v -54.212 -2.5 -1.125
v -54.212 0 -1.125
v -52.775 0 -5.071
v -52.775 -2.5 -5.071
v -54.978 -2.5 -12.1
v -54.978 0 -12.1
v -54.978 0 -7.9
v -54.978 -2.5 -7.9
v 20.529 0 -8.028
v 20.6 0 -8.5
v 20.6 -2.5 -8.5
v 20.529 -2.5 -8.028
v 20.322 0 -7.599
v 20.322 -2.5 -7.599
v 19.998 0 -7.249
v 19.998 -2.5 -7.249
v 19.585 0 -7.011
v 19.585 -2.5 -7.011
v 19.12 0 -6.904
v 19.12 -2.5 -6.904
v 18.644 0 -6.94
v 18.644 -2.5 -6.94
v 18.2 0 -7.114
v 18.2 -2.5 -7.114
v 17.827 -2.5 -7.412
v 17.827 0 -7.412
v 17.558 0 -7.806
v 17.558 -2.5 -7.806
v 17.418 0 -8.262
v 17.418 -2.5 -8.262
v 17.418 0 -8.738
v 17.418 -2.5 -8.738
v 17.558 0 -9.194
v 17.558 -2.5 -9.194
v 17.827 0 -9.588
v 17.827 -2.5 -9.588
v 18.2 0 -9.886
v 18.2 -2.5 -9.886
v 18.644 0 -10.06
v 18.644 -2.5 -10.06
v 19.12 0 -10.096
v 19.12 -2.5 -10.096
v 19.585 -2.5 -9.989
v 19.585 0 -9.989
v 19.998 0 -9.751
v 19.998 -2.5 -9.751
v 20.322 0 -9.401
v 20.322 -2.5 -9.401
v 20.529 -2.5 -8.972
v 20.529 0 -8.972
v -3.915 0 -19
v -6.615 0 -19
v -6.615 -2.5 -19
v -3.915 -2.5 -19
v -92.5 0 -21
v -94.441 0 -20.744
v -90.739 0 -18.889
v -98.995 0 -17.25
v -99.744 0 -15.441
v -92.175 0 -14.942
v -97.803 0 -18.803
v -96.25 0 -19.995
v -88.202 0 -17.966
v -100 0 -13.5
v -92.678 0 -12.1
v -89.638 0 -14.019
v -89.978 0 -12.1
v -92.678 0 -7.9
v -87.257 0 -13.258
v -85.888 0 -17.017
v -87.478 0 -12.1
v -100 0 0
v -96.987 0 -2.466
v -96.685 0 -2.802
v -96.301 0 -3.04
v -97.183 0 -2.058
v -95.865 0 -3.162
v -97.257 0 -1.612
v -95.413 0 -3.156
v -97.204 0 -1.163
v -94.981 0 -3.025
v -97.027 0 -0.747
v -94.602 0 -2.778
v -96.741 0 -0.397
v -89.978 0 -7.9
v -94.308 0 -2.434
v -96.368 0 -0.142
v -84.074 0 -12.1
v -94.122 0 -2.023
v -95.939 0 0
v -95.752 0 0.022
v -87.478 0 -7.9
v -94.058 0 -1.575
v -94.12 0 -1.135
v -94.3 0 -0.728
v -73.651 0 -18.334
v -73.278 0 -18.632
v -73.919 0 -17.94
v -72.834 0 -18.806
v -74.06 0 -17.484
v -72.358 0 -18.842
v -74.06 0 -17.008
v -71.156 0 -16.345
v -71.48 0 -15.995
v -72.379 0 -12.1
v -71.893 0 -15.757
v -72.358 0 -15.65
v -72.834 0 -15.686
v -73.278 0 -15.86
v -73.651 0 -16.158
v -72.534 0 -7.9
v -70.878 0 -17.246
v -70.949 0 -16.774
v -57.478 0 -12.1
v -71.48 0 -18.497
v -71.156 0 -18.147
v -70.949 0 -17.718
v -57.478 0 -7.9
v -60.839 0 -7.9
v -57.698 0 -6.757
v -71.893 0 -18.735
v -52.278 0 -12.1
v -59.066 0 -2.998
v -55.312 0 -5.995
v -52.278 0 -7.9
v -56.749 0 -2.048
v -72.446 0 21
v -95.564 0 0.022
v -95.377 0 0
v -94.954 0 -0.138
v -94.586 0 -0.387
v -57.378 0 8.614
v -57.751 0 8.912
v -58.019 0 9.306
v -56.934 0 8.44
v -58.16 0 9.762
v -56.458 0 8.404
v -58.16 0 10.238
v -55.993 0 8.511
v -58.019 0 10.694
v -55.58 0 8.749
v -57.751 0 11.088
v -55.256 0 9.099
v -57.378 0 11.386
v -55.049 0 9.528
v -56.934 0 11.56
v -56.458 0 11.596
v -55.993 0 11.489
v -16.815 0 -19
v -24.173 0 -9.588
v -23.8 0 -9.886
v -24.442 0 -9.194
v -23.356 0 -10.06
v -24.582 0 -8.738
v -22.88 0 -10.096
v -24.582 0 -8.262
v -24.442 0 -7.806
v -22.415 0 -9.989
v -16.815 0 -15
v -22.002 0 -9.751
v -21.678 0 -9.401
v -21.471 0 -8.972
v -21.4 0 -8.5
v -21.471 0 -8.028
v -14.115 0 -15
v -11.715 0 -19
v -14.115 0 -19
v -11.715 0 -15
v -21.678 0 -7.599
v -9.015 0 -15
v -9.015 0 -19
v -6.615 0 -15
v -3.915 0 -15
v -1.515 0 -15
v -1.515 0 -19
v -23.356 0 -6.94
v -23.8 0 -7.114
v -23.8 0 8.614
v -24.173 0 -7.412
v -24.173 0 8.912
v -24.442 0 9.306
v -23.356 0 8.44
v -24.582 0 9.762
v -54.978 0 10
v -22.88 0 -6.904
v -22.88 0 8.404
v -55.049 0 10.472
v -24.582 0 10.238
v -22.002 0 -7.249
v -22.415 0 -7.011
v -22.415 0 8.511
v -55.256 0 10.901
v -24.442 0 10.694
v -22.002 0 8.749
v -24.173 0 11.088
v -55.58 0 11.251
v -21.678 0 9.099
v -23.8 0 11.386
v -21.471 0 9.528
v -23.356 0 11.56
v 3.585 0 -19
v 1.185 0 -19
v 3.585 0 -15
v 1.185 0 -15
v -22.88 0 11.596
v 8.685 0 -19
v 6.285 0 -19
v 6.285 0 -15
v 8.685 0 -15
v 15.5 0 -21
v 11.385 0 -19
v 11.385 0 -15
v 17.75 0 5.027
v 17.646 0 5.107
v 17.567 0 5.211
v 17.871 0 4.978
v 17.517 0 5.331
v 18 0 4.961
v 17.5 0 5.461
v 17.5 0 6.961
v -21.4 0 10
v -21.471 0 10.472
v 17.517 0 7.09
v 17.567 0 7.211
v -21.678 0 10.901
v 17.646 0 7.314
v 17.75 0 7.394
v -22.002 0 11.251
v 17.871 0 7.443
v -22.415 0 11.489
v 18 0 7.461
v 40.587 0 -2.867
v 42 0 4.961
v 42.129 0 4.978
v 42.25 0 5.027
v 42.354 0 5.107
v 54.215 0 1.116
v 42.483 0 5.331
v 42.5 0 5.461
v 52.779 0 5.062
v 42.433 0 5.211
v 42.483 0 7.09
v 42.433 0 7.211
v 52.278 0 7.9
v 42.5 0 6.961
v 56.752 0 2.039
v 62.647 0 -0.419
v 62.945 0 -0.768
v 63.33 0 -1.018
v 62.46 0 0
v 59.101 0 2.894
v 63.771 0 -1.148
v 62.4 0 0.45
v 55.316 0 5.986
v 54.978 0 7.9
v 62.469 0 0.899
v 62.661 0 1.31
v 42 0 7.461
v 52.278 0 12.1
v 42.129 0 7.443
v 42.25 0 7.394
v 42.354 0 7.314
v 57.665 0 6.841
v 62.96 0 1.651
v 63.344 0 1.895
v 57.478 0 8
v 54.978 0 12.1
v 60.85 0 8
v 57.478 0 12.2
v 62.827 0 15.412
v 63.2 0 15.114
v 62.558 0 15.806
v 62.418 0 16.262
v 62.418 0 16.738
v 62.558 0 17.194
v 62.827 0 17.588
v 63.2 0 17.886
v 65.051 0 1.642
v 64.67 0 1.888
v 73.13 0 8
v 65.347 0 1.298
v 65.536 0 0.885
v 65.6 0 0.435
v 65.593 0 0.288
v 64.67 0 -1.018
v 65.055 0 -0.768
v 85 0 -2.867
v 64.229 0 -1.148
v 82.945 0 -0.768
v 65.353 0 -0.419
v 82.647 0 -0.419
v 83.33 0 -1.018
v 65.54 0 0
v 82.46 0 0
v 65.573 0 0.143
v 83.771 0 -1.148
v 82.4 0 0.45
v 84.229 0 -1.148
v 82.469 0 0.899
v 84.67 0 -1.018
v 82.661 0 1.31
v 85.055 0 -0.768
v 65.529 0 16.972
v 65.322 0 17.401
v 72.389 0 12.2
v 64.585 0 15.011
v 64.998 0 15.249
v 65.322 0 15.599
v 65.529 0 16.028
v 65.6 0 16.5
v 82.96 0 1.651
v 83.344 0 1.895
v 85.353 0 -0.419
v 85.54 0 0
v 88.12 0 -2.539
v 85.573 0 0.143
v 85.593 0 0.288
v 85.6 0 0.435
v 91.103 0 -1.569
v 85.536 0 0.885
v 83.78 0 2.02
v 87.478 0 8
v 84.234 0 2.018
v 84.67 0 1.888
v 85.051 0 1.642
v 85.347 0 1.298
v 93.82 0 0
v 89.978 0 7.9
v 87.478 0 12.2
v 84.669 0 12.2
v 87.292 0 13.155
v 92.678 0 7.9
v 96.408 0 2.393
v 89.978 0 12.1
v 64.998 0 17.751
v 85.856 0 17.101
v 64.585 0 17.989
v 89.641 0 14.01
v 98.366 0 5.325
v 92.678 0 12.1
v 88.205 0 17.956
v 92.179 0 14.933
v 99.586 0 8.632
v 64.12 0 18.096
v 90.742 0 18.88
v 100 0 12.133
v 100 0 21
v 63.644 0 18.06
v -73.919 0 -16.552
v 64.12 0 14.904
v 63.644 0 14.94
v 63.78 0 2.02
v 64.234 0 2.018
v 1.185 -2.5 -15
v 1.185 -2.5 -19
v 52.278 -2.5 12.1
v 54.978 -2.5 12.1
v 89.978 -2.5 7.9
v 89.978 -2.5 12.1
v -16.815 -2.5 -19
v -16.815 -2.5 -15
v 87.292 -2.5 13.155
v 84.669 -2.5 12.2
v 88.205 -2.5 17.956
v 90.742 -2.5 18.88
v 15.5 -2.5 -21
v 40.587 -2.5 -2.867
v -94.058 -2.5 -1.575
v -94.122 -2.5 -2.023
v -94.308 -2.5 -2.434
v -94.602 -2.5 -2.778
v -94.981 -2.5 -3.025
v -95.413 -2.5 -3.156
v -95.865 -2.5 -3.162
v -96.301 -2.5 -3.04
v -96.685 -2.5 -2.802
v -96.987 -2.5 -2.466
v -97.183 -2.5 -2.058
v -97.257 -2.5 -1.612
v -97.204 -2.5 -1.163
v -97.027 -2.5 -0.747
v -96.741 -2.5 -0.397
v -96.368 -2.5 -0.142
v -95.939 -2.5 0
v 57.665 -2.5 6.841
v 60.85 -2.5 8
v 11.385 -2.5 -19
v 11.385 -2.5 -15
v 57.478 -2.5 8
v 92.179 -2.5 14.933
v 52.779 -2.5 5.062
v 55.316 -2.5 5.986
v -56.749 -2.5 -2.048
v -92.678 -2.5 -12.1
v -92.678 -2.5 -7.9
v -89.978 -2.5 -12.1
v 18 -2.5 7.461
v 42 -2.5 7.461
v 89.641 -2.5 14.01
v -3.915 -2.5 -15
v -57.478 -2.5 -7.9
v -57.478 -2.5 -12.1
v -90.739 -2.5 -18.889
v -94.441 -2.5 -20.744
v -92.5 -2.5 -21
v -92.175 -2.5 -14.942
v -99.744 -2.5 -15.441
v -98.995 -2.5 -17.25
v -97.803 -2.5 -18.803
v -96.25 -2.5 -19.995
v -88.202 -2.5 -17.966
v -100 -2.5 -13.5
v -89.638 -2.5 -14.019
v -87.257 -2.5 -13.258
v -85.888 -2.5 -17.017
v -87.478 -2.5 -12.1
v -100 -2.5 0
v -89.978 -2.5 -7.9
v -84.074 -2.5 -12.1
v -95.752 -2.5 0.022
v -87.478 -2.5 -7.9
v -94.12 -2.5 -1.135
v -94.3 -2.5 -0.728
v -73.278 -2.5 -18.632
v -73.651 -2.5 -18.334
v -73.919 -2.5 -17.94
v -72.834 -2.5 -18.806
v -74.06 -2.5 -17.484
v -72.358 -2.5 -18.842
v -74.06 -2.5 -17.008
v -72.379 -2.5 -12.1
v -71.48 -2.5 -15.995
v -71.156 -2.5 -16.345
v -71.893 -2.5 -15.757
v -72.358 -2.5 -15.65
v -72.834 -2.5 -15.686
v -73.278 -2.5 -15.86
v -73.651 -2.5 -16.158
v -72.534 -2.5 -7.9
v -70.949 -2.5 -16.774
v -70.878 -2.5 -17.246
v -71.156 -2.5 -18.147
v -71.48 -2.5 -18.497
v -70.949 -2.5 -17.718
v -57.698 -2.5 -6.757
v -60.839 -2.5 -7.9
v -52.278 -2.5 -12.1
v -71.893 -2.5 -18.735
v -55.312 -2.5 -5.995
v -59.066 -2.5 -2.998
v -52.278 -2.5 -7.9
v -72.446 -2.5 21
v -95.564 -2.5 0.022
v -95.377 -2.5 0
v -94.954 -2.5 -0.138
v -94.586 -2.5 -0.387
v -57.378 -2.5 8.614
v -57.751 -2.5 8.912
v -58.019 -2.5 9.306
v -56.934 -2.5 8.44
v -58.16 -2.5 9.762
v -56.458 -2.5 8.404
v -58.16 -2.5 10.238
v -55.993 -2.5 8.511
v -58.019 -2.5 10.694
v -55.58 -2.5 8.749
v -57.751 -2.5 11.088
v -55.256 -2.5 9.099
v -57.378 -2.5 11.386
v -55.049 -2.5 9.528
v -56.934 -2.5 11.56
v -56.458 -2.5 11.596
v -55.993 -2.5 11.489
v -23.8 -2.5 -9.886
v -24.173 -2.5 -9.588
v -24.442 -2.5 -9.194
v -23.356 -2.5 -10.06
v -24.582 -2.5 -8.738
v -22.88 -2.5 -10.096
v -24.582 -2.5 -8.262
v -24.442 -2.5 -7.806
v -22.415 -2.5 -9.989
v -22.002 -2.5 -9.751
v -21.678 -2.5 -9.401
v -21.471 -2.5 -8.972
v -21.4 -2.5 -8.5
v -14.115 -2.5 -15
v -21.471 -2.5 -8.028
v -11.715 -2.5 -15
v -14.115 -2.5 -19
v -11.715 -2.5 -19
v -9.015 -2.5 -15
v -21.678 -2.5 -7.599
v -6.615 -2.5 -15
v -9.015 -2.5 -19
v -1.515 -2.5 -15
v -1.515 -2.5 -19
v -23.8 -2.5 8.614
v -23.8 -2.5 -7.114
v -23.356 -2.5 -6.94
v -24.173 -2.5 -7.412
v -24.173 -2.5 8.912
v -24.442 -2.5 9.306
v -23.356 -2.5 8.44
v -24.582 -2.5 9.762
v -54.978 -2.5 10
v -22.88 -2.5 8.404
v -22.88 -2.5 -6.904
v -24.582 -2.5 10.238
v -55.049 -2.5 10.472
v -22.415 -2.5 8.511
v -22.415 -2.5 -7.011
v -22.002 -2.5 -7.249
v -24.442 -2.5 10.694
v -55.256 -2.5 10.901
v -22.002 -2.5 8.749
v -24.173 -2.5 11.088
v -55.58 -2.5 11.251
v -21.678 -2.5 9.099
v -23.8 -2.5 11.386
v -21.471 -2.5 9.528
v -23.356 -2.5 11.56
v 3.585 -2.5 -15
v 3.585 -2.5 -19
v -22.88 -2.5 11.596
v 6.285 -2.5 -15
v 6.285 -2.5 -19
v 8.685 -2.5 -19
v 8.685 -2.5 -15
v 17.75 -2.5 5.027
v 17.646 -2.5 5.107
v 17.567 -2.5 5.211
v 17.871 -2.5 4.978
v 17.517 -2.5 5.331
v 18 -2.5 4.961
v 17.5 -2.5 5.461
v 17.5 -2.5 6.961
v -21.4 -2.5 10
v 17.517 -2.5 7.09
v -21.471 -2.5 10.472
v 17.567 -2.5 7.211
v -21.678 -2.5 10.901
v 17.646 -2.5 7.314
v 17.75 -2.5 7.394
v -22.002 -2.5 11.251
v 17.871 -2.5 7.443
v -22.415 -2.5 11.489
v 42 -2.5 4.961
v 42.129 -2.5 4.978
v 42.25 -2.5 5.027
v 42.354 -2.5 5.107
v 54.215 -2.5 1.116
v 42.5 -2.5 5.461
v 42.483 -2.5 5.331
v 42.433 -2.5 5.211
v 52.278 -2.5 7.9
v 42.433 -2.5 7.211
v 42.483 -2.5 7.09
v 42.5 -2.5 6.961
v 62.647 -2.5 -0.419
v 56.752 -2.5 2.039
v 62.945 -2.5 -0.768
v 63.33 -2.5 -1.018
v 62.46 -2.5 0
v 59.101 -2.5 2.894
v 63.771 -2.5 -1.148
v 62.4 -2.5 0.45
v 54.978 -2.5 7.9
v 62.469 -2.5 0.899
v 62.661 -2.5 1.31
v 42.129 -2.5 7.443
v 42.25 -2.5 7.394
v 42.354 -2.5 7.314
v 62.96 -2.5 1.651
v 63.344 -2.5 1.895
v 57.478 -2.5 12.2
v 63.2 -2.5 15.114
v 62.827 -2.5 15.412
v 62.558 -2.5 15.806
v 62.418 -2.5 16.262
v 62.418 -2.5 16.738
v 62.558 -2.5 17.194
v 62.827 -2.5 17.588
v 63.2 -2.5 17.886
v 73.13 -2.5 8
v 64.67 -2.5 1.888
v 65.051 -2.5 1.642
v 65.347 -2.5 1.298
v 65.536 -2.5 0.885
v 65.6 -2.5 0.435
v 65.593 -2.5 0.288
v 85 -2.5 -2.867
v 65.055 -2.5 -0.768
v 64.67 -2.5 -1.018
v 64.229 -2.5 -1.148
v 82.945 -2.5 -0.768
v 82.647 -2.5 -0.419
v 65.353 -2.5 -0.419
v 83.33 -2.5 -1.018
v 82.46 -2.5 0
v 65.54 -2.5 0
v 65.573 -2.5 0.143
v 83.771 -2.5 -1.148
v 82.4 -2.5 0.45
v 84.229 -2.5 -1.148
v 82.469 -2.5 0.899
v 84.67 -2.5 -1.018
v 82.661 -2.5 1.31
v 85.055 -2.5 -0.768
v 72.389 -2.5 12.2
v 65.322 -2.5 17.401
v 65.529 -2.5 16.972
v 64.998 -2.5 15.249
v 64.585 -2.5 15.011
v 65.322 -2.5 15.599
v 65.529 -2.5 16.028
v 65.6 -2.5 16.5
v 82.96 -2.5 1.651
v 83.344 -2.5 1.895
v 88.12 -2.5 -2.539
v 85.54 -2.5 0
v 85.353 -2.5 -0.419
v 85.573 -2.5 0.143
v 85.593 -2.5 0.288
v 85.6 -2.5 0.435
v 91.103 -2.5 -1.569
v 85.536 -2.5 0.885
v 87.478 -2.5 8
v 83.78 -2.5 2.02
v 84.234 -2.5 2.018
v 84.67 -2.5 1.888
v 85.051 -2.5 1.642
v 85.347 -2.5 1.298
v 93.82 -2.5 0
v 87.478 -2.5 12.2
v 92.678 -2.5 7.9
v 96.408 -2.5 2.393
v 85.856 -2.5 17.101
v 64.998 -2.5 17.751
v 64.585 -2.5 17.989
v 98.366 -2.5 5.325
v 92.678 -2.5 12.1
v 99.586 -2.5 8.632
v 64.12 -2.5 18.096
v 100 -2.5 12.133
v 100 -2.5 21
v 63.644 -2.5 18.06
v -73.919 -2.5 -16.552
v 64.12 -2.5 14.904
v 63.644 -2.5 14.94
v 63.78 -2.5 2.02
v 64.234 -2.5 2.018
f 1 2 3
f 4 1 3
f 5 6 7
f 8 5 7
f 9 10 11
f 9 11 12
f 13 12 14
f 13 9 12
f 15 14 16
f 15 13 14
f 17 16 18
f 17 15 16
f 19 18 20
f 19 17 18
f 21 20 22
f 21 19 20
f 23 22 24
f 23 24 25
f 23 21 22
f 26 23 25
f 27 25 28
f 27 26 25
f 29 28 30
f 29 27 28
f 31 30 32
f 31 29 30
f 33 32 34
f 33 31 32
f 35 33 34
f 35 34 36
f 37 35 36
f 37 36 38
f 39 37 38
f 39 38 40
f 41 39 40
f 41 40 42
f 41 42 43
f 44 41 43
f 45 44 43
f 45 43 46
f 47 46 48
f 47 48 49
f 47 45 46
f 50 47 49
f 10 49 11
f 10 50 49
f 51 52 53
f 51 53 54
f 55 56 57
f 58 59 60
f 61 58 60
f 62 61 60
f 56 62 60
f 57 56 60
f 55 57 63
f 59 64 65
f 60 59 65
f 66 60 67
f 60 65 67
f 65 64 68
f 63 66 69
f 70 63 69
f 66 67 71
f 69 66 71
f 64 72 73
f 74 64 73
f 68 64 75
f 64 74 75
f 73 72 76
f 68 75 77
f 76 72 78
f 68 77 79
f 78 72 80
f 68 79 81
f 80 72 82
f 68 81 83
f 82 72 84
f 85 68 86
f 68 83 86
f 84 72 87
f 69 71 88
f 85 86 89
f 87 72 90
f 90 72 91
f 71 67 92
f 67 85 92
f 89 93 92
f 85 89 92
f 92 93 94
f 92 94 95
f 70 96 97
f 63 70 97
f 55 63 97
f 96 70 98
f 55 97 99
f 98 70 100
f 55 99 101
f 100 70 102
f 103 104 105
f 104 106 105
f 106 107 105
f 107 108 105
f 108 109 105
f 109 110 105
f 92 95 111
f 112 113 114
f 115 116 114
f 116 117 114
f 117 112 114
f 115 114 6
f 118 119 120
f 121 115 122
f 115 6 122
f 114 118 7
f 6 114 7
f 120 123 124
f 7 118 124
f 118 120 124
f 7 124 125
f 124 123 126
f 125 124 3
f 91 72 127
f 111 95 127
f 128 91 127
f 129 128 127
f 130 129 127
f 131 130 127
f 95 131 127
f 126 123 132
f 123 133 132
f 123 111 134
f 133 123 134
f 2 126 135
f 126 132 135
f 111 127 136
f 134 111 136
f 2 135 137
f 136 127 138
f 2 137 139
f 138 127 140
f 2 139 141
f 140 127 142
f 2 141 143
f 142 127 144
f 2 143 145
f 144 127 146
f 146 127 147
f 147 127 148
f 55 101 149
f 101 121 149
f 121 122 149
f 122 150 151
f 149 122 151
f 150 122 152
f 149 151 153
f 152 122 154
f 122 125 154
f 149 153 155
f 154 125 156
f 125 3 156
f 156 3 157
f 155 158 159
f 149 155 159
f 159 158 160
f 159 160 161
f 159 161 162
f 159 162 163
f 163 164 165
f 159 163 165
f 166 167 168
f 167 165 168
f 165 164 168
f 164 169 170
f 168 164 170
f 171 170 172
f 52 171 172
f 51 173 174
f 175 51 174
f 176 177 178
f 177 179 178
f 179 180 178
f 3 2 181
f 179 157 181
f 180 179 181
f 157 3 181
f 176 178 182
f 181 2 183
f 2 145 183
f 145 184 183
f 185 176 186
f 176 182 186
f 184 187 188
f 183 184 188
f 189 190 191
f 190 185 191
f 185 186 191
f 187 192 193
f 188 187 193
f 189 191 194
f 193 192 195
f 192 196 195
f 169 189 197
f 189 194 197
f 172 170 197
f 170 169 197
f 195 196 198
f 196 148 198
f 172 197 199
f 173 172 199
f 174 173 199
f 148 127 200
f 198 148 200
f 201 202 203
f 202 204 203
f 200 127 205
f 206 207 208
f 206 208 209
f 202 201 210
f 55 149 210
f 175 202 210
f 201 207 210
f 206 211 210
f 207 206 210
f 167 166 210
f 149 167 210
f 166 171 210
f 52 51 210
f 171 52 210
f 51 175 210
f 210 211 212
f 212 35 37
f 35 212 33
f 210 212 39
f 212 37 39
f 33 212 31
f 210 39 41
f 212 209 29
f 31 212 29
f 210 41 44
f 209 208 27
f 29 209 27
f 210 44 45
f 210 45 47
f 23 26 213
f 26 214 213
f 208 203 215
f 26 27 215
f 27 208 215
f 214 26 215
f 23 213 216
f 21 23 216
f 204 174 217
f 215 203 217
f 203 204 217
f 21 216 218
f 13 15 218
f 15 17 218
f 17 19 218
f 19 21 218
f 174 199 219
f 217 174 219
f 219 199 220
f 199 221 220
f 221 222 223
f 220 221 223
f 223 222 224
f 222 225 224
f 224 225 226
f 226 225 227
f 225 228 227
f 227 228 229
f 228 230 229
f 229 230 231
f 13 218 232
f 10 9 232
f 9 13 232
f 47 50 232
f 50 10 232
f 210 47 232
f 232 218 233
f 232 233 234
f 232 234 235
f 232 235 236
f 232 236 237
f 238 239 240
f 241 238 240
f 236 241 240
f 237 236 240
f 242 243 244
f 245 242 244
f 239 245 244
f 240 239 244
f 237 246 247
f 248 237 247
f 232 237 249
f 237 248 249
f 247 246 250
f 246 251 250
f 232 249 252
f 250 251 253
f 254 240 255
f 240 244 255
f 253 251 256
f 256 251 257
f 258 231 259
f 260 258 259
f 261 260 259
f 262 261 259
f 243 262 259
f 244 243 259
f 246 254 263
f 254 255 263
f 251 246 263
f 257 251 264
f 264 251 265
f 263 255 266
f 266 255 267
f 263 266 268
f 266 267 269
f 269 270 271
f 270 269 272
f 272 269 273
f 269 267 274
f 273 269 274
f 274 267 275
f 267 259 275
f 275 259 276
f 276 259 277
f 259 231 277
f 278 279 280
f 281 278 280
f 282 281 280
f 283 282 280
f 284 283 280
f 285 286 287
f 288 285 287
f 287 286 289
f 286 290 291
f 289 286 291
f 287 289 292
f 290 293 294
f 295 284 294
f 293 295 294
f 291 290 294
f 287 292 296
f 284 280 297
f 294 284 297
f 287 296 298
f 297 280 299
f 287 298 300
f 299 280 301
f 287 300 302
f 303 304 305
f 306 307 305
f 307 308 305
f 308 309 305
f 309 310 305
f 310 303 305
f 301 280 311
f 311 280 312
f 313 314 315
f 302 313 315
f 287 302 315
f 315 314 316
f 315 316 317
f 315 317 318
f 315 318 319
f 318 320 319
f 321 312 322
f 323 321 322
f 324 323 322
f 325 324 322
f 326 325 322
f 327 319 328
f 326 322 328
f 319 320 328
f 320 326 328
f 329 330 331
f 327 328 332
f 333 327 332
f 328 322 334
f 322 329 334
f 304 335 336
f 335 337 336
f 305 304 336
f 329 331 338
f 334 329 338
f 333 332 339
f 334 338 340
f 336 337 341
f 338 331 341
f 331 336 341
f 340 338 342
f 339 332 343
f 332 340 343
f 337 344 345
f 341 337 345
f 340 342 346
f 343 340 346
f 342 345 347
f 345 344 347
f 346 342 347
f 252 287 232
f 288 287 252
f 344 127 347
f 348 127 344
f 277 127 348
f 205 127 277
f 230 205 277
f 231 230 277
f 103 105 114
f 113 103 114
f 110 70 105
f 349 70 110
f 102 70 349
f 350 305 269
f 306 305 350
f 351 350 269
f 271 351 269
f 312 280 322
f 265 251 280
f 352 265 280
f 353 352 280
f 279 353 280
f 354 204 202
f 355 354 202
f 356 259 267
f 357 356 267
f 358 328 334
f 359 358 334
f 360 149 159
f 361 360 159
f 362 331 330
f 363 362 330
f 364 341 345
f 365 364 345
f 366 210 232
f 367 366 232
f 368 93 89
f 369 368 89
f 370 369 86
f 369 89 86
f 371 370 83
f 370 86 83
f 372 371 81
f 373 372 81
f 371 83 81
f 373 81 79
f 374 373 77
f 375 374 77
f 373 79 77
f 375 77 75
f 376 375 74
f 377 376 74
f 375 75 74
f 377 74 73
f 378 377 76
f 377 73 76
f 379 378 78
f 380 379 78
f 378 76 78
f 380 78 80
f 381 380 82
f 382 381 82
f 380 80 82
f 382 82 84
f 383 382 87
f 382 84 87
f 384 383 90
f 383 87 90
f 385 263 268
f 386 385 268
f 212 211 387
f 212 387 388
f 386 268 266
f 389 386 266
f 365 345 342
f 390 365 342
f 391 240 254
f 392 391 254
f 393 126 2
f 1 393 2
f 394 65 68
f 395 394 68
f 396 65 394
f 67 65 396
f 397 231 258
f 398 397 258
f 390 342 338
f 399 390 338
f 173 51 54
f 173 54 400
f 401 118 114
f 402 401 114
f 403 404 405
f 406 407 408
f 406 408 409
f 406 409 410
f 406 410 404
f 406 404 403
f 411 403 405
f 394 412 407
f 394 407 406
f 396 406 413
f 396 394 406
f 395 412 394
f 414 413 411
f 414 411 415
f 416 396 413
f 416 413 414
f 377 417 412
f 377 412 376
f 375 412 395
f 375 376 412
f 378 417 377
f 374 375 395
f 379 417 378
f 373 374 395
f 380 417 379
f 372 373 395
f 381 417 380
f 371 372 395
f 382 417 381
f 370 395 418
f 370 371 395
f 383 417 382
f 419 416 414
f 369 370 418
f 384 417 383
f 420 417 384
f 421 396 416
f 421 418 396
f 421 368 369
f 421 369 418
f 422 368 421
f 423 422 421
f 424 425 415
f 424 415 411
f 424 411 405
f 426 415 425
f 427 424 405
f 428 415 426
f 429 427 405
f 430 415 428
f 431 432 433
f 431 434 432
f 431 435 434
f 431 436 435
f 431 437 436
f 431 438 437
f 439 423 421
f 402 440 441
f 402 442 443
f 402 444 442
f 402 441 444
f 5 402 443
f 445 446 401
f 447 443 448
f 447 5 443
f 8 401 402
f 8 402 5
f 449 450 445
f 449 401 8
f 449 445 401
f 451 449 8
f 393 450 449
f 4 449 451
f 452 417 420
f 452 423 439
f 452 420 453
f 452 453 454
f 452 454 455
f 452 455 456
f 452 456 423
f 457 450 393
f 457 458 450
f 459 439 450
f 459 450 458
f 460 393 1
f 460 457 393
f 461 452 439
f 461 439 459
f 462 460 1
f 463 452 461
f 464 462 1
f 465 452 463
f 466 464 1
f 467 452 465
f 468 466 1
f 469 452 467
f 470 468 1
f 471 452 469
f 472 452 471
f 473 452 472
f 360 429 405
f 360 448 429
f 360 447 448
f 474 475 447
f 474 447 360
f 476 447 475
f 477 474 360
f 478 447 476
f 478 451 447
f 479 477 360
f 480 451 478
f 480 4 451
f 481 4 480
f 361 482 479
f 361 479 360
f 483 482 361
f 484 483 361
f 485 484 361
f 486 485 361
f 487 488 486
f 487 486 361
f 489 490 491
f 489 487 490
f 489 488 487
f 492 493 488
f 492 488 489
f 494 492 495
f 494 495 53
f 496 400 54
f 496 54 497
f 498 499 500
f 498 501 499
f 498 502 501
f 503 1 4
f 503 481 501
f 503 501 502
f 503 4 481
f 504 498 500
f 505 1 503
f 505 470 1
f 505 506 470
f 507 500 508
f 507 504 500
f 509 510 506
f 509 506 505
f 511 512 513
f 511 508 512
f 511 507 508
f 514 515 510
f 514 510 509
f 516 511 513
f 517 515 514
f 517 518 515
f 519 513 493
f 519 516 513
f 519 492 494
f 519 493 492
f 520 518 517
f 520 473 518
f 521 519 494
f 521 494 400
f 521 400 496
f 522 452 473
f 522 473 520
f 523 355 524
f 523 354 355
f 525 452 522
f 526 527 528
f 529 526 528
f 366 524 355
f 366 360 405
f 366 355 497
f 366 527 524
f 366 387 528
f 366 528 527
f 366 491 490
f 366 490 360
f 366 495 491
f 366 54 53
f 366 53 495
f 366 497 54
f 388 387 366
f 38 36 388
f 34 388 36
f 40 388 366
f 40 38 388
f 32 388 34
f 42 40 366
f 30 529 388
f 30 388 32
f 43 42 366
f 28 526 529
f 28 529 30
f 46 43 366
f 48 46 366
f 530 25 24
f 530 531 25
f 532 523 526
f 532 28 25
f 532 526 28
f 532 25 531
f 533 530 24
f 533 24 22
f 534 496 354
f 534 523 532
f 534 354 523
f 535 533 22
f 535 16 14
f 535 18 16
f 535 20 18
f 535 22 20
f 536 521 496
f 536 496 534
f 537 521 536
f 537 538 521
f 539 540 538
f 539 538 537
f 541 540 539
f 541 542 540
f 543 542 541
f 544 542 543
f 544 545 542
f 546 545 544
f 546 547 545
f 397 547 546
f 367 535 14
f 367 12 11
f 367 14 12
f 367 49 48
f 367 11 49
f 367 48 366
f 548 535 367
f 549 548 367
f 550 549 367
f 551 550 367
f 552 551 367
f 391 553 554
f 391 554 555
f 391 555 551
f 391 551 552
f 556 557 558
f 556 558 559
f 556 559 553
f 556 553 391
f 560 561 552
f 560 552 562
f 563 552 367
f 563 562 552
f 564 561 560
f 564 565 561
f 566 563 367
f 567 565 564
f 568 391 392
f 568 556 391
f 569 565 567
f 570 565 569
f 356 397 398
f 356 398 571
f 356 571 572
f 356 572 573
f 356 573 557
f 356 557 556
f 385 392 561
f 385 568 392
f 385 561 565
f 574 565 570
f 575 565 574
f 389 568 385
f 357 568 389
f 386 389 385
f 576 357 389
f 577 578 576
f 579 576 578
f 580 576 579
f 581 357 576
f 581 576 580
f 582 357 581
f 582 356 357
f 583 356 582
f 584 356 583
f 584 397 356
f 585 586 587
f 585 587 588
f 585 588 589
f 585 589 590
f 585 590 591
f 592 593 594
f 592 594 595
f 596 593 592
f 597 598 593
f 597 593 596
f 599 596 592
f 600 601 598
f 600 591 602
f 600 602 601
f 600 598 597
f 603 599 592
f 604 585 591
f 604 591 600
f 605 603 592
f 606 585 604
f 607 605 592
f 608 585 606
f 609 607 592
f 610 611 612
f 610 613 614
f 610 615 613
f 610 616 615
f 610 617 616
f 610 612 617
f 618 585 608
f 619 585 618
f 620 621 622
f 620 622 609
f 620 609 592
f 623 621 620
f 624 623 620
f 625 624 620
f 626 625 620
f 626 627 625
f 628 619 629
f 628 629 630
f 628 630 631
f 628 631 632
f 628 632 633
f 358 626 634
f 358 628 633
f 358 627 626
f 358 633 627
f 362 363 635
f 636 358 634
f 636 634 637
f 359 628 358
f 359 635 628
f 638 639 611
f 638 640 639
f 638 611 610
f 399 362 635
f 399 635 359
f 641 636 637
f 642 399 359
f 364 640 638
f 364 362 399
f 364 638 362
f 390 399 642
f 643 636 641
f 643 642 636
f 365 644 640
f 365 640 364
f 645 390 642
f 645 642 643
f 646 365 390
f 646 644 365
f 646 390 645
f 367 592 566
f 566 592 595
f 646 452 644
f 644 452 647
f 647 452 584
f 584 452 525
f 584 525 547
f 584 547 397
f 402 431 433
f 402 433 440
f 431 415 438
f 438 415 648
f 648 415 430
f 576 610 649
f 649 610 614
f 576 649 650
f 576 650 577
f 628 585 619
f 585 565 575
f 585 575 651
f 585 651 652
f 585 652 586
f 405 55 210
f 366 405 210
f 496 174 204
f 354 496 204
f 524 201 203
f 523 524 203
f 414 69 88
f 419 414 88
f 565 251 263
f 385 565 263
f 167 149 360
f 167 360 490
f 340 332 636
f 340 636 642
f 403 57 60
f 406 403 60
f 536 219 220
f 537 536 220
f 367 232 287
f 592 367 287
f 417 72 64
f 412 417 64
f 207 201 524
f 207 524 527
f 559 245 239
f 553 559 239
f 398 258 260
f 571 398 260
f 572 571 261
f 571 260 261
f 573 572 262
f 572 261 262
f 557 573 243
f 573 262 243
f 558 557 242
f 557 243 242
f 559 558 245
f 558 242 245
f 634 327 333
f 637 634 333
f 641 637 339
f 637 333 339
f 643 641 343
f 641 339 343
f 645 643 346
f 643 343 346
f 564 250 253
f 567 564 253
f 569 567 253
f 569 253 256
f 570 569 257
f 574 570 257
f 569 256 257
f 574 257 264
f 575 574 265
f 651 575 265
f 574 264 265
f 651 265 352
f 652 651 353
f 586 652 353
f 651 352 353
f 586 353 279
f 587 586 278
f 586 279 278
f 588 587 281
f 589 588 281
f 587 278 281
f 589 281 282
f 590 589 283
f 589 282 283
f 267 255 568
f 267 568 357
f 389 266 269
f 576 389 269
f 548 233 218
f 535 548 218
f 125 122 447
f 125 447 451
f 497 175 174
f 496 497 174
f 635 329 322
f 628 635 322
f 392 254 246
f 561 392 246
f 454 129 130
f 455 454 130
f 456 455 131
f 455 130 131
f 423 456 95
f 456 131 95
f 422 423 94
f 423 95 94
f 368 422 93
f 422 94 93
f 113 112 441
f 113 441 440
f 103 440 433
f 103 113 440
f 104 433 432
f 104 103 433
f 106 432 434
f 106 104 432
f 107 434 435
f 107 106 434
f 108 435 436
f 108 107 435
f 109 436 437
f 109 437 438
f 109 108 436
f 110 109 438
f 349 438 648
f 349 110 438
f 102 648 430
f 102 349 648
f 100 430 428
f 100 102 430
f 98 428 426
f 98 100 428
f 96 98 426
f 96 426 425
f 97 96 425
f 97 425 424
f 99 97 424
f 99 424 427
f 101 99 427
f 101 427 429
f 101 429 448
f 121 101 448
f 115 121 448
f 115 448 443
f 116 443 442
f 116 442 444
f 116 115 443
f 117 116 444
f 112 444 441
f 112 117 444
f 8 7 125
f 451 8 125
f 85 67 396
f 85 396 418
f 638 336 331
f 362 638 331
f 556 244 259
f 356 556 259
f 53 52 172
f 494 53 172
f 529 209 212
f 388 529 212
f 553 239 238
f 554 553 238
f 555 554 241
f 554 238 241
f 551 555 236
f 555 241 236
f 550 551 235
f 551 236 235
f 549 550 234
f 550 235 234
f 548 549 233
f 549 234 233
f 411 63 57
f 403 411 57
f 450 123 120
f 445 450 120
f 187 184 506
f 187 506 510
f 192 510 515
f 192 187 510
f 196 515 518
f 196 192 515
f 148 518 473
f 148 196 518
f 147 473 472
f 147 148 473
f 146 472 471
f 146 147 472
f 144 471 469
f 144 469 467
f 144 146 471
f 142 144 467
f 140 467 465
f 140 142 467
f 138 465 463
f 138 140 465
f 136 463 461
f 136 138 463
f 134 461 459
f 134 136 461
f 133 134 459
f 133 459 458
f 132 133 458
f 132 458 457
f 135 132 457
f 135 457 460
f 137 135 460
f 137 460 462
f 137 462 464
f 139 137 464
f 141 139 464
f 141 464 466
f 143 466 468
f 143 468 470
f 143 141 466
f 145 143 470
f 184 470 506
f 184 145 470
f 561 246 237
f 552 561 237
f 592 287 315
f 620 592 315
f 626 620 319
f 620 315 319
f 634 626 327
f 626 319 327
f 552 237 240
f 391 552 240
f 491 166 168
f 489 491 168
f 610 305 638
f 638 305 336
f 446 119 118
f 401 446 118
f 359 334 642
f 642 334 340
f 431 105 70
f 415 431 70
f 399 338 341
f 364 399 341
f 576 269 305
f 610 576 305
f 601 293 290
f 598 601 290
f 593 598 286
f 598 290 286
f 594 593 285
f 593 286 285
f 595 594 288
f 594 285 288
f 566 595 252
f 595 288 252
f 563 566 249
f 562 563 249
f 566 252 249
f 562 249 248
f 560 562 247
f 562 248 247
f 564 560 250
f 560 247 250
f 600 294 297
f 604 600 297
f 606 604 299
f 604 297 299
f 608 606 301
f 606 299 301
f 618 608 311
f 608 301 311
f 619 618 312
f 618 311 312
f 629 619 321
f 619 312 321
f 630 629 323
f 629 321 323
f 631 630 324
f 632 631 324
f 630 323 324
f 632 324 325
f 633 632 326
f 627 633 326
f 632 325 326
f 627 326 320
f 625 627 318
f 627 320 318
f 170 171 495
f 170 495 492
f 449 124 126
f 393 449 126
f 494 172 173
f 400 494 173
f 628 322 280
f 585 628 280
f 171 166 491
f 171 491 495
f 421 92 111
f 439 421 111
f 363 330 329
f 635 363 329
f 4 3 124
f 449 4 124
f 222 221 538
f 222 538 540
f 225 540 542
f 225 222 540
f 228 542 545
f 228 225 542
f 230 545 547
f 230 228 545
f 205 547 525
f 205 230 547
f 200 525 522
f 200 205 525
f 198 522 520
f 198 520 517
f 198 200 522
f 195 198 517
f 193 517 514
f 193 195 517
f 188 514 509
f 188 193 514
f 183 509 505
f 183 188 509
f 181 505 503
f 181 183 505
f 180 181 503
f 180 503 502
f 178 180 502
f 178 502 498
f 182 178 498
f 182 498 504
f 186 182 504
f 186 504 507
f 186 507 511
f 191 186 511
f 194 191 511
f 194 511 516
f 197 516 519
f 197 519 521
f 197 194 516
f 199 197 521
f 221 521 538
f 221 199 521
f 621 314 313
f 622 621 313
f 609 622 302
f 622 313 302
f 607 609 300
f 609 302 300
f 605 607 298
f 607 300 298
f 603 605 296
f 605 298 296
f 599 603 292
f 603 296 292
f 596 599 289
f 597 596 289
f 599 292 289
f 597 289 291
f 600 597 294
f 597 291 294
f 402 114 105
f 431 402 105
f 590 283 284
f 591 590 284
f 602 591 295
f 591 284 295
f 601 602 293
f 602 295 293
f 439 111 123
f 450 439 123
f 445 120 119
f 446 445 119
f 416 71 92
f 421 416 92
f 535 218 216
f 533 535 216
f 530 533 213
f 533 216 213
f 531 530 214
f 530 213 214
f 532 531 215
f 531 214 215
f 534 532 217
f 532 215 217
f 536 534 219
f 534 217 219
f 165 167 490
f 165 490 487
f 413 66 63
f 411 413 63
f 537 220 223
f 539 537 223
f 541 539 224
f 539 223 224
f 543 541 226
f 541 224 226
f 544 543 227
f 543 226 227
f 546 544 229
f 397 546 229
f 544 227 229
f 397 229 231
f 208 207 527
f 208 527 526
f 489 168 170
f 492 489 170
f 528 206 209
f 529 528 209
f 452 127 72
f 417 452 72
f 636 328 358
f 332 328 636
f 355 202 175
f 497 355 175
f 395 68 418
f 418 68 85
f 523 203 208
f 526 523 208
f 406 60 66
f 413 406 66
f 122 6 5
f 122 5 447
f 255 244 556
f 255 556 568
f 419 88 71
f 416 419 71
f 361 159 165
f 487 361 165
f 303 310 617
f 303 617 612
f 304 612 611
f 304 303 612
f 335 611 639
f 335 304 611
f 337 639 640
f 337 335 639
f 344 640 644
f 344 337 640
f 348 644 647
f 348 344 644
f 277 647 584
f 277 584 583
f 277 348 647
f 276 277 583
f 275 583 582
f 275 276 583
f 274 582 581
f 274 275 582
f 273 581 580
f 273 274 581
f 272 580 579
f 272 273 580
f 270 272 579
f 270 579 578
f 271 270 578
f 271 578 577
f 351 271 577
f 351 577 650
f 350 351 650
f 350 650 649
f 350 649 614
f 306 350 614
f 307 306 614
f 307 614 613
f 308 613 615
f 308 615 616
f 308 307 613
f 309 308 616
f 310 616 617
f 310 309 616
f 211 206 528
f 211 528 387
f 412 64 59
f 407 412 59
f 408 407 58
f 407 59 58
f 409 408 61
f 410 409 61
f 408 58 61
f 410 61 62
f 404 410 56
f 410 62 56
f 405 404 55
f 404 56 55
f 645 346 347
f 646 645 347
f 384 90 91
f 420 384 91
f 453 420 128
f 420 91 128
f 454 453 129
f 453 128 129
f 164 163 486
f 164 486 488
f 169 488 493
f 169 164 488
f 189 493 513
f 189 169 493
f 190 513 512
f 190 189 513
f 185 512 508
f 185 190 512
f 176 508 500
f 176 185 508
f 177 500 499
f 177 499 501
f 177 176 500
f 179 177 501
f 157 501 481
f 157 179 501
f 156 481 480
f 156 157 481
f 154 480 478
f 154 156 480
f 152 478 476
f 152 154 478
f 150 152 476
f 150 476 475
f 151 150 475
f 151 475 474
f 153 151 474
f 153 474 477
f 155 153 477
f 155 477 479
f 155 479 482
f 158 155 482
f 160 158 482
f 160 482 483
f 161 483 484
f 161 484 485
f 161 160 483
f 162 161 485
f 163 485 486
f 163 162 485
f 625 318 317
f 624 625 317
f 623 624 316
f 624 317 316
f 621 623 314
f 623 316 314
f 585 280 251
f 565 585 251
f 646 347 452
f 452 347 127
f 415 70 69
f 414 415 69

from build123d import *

# Parameters (mm, degrees)
F0_R     = 1.6
F0_W     = 2.7
F0_H     = 4
F0_H_2   = 4.2
F1_DEPTH = 2.5


with BuildPart() as f1:
    # F0 (on Front) → F1 (new body)
    with BuildSketch(Plane.XZ):
        with BuildLine():
            Line((-72.446153, 21), (-100, 0))
            Line((-100, 0), (-95.938877, 0))
            ThreePointArc((-95.938877, 0), (-95.657736, 0.024894), (-95.376595, 0))
            Line((-95.376595, 0), (0, 0))
            Line((0, 0), (0, 21))
            Line((0, 21), (-15.5, 21))
            Line((-15.5, 21), (-72.446153, 21))
        make_face()
        with Locations((-56.57779, 10)):
            Circle(F0_R, mode=Mode.SUBTRACT)
        with Locations((-23, 10)):
            Circle(F0_R, mode=Mode.SUBTRACT)
        with BuildLine():
            Line((-95.938877, 0), (-100, 0))
            Line((-100, 0), (-100, -13.5))
            ThreePointArc((-100, -13.5), (-97.803301, -18.803301), (-92.5, -21))
            Line((-92.5, -21), (0, -21))
            Line((0, -21), (0, -19))
            Line((0, -19), (-1.515, -19))
            Line((-1.515, -19), (-1.515, -15))
            Line((-1.515, -15), (0, -15))
            Line((0, -15), (0, 0))
            Line((0, 0), (-95.376595, 0))
            ThreePointArc((-95.376595, 0), (-94.430987, -0.547932), (-94.057736, -1.575106))
            ThreePointArc((-94.057736, -1.575106), (-96.68491, -2.801855), (-95.938877, 0))
        make_face()
        Polygon((-92.175341, -14.942273), (-89.638171, -14.018818), (-88.201686, -17.965527), (-90.738856, -18.888982), align=None, mode=Mode.SUBTRACT)
        with Locations((-72.47779, -17.245993)):
            Circle(F0_R, mode=Mode.SUBTRACT)
        with Locations((-15.465, -17)):
            Rectangle(F0_W, F0_H, mode=Mode.SUBTRACT)
        with Locations((-10.365, -17)):
            Rectangle(F0_W, F0_H, mode=Mode.SUBTRACT)
        with Locations((-5.265, -17)):
            Rectangle(F0_W, F0_H, mode=Mode.SUBTRACT)
        with Locations((-91.32779, -10)):
            Rectangle(F0_W, F0_H_2, mode=Mode.SUBTRACT)
        Polygon((-87.47779, -12.1), (-87.47779, -7.9), (-72.534475, -7.9), (-59.065768, -2.997792), (-57.697688, -6.756562), (-60.839257, -7.9), (-57.47779, -7.9), (-57.47779, -12.1), (-72.378662, -12.1), (-85.888466, -17.017167), (-87.256547, -13.258396), (-84.07388, -12.1), align=None, mode=Mode.SUBTRACT)
        with Locations((-53.62779, -10)):
            Rectangle(F0_W, F0_H_2, mode=Mode.SUBTRACT)
        Polygon((-56.748929, -2.048113), (-54.211759, -1.124659), (-52.775274, -5.071368), (-55.312444, -5.994822), align=None, mode=Mode.SUBTRACT)
        with Locations((-23, -8.5)):
            Circle(F0_R, mode=Mode.SUBTRACT)
        with BuildLine():
            Line((62.46032, 0), (0, 0))
            Line((0, 0), (0, -15))
            Line((0, -15), (1.185, -15))
            Line((1.185, -15), (1.185, -19))
            Line((1.185, -19), (0, -19))
            Line((0, -19), (0, -21))
            Line((0, -21), (15.5, -21))
            Line((15.5, -21), (40.587112, -2.866724))
            Line((40.587112, -2.866724), (85, -2.866724))
            ThreePointArc((85, -2.866724), (89.636856, -2.132052), (93.819502, 0))
            Line((93.819502, 0), (85.53968, 0))
            ThreePointArc((85.53968, 0), (84, -1.164814), (82.46032, 0))
            Line((82.46032, 0), (65.53968, 0))
            ThreePointArc((65.53968, 0), (64, -1.164814), (62.46032, 0))
        make_face()
        with Locations((4.935, -17)):
            Rectangle(F0_W, F0_H, mode=Mode.SUBTRACT)
        with Locations((10.035, -17)):
            Rectangle(F0_W, F0_H, mode=Mode.SUBTRACT)
        with Locations((19, -8.5)):
            Circle(F0_R, mode=Mode.SUBTRACT)
        with BuildLine():
            Line((0, 21), (0, 0))
            Line((0, 0), (62.46032, 0))
            ThreePointArc((62.46032, 0), (63.780327, 2.020034), (65.6, 0.435186))
            ThreePointArc((65.6, 0.435186), (65.584848, 0.215513), (65.53968, 0))
            Line((65.53968, 0), (82.46032, 0))
            ThreePointArc((82.46032, 0), (83.780327, 2.020034), (85.6, 0.435186))
            ThreePointArc((85.6, 0.435186), (85.584848, 0.215513), (85.53968, 0))
            Line((85.53968, 0), (93.819502, 0))
            ThreePointArc((93.819502, 0), (98.365862, 5.324918), (100, 12.133276))
            Line((100, 12.133276), (100, 21))
            Line((100, 21), (0, 21))
        make_face()
        with BuildLine():
            Line((18, 7.460512), (42, 7.460512))
            ThreePointArc((42, 7.460512), (42.353553, 7.314066), (42.5, 6.960512))
            Line((42.5, 6.960512), (42.5, 5.460512))
            ThreePointArc((42.5, 5.460512), (42.353553, 5.106959), (42, 4.960512))
            Line((42, 4.960512), (18, 4.960512))
            ThreePointArc((18, 4.960512), (17.646447, 5.106959), (17.5, 5.460512))
            Line((17.5, 5.460512), (17.5, 6.960512))
            ThreePointArc((17.5, 6.960512), (17.646447, 7.314066), (18, 7.460512))
        make_face(mode=Mode.SUBTRACT)
        Polygon((56.752226, 2.039054), (54.215056, 1.115599), (52.778572, 5.062308), (55.315742, 5.985763), align=None, mode=Mode.SUBTRACT)
        with Locations((53.62779, 10)):
            Rectangle(F0_W, F0_H_2, mode=Mode.SUBTRACT)
        Polygon((57.47779, 8), (57.47779, 12.2), (72.389218, 12.2), (85.855752, 17.101418), (87.292237, 13.154709), (84.669196, 12.2), (87.47779, 12.2), (87.47779, 8), (73.129791, 8), (59.101458, 2.894104), (57.664973, 6.840813), (60.849813, 8), align=None, mode=Mode.SUBTRACT)
        with Locations((91.32779, 10)):
            Rectangle(F0_W, F0_H_2, mode=Mode.SUBTRACT)
        with Locations((64, 16.5)):
            Circle(F0_R, mode=Mode.SUBTRACT)
        Polygon((88.204984, 17.956468), (90.742154, 18.879922), (92.178638, 14.933213), (89.641468, 14.009759), align=None, mode=Mode.SUBTRACT)
    extrude(amount=F1_DEPTH)


solid = f1.part
